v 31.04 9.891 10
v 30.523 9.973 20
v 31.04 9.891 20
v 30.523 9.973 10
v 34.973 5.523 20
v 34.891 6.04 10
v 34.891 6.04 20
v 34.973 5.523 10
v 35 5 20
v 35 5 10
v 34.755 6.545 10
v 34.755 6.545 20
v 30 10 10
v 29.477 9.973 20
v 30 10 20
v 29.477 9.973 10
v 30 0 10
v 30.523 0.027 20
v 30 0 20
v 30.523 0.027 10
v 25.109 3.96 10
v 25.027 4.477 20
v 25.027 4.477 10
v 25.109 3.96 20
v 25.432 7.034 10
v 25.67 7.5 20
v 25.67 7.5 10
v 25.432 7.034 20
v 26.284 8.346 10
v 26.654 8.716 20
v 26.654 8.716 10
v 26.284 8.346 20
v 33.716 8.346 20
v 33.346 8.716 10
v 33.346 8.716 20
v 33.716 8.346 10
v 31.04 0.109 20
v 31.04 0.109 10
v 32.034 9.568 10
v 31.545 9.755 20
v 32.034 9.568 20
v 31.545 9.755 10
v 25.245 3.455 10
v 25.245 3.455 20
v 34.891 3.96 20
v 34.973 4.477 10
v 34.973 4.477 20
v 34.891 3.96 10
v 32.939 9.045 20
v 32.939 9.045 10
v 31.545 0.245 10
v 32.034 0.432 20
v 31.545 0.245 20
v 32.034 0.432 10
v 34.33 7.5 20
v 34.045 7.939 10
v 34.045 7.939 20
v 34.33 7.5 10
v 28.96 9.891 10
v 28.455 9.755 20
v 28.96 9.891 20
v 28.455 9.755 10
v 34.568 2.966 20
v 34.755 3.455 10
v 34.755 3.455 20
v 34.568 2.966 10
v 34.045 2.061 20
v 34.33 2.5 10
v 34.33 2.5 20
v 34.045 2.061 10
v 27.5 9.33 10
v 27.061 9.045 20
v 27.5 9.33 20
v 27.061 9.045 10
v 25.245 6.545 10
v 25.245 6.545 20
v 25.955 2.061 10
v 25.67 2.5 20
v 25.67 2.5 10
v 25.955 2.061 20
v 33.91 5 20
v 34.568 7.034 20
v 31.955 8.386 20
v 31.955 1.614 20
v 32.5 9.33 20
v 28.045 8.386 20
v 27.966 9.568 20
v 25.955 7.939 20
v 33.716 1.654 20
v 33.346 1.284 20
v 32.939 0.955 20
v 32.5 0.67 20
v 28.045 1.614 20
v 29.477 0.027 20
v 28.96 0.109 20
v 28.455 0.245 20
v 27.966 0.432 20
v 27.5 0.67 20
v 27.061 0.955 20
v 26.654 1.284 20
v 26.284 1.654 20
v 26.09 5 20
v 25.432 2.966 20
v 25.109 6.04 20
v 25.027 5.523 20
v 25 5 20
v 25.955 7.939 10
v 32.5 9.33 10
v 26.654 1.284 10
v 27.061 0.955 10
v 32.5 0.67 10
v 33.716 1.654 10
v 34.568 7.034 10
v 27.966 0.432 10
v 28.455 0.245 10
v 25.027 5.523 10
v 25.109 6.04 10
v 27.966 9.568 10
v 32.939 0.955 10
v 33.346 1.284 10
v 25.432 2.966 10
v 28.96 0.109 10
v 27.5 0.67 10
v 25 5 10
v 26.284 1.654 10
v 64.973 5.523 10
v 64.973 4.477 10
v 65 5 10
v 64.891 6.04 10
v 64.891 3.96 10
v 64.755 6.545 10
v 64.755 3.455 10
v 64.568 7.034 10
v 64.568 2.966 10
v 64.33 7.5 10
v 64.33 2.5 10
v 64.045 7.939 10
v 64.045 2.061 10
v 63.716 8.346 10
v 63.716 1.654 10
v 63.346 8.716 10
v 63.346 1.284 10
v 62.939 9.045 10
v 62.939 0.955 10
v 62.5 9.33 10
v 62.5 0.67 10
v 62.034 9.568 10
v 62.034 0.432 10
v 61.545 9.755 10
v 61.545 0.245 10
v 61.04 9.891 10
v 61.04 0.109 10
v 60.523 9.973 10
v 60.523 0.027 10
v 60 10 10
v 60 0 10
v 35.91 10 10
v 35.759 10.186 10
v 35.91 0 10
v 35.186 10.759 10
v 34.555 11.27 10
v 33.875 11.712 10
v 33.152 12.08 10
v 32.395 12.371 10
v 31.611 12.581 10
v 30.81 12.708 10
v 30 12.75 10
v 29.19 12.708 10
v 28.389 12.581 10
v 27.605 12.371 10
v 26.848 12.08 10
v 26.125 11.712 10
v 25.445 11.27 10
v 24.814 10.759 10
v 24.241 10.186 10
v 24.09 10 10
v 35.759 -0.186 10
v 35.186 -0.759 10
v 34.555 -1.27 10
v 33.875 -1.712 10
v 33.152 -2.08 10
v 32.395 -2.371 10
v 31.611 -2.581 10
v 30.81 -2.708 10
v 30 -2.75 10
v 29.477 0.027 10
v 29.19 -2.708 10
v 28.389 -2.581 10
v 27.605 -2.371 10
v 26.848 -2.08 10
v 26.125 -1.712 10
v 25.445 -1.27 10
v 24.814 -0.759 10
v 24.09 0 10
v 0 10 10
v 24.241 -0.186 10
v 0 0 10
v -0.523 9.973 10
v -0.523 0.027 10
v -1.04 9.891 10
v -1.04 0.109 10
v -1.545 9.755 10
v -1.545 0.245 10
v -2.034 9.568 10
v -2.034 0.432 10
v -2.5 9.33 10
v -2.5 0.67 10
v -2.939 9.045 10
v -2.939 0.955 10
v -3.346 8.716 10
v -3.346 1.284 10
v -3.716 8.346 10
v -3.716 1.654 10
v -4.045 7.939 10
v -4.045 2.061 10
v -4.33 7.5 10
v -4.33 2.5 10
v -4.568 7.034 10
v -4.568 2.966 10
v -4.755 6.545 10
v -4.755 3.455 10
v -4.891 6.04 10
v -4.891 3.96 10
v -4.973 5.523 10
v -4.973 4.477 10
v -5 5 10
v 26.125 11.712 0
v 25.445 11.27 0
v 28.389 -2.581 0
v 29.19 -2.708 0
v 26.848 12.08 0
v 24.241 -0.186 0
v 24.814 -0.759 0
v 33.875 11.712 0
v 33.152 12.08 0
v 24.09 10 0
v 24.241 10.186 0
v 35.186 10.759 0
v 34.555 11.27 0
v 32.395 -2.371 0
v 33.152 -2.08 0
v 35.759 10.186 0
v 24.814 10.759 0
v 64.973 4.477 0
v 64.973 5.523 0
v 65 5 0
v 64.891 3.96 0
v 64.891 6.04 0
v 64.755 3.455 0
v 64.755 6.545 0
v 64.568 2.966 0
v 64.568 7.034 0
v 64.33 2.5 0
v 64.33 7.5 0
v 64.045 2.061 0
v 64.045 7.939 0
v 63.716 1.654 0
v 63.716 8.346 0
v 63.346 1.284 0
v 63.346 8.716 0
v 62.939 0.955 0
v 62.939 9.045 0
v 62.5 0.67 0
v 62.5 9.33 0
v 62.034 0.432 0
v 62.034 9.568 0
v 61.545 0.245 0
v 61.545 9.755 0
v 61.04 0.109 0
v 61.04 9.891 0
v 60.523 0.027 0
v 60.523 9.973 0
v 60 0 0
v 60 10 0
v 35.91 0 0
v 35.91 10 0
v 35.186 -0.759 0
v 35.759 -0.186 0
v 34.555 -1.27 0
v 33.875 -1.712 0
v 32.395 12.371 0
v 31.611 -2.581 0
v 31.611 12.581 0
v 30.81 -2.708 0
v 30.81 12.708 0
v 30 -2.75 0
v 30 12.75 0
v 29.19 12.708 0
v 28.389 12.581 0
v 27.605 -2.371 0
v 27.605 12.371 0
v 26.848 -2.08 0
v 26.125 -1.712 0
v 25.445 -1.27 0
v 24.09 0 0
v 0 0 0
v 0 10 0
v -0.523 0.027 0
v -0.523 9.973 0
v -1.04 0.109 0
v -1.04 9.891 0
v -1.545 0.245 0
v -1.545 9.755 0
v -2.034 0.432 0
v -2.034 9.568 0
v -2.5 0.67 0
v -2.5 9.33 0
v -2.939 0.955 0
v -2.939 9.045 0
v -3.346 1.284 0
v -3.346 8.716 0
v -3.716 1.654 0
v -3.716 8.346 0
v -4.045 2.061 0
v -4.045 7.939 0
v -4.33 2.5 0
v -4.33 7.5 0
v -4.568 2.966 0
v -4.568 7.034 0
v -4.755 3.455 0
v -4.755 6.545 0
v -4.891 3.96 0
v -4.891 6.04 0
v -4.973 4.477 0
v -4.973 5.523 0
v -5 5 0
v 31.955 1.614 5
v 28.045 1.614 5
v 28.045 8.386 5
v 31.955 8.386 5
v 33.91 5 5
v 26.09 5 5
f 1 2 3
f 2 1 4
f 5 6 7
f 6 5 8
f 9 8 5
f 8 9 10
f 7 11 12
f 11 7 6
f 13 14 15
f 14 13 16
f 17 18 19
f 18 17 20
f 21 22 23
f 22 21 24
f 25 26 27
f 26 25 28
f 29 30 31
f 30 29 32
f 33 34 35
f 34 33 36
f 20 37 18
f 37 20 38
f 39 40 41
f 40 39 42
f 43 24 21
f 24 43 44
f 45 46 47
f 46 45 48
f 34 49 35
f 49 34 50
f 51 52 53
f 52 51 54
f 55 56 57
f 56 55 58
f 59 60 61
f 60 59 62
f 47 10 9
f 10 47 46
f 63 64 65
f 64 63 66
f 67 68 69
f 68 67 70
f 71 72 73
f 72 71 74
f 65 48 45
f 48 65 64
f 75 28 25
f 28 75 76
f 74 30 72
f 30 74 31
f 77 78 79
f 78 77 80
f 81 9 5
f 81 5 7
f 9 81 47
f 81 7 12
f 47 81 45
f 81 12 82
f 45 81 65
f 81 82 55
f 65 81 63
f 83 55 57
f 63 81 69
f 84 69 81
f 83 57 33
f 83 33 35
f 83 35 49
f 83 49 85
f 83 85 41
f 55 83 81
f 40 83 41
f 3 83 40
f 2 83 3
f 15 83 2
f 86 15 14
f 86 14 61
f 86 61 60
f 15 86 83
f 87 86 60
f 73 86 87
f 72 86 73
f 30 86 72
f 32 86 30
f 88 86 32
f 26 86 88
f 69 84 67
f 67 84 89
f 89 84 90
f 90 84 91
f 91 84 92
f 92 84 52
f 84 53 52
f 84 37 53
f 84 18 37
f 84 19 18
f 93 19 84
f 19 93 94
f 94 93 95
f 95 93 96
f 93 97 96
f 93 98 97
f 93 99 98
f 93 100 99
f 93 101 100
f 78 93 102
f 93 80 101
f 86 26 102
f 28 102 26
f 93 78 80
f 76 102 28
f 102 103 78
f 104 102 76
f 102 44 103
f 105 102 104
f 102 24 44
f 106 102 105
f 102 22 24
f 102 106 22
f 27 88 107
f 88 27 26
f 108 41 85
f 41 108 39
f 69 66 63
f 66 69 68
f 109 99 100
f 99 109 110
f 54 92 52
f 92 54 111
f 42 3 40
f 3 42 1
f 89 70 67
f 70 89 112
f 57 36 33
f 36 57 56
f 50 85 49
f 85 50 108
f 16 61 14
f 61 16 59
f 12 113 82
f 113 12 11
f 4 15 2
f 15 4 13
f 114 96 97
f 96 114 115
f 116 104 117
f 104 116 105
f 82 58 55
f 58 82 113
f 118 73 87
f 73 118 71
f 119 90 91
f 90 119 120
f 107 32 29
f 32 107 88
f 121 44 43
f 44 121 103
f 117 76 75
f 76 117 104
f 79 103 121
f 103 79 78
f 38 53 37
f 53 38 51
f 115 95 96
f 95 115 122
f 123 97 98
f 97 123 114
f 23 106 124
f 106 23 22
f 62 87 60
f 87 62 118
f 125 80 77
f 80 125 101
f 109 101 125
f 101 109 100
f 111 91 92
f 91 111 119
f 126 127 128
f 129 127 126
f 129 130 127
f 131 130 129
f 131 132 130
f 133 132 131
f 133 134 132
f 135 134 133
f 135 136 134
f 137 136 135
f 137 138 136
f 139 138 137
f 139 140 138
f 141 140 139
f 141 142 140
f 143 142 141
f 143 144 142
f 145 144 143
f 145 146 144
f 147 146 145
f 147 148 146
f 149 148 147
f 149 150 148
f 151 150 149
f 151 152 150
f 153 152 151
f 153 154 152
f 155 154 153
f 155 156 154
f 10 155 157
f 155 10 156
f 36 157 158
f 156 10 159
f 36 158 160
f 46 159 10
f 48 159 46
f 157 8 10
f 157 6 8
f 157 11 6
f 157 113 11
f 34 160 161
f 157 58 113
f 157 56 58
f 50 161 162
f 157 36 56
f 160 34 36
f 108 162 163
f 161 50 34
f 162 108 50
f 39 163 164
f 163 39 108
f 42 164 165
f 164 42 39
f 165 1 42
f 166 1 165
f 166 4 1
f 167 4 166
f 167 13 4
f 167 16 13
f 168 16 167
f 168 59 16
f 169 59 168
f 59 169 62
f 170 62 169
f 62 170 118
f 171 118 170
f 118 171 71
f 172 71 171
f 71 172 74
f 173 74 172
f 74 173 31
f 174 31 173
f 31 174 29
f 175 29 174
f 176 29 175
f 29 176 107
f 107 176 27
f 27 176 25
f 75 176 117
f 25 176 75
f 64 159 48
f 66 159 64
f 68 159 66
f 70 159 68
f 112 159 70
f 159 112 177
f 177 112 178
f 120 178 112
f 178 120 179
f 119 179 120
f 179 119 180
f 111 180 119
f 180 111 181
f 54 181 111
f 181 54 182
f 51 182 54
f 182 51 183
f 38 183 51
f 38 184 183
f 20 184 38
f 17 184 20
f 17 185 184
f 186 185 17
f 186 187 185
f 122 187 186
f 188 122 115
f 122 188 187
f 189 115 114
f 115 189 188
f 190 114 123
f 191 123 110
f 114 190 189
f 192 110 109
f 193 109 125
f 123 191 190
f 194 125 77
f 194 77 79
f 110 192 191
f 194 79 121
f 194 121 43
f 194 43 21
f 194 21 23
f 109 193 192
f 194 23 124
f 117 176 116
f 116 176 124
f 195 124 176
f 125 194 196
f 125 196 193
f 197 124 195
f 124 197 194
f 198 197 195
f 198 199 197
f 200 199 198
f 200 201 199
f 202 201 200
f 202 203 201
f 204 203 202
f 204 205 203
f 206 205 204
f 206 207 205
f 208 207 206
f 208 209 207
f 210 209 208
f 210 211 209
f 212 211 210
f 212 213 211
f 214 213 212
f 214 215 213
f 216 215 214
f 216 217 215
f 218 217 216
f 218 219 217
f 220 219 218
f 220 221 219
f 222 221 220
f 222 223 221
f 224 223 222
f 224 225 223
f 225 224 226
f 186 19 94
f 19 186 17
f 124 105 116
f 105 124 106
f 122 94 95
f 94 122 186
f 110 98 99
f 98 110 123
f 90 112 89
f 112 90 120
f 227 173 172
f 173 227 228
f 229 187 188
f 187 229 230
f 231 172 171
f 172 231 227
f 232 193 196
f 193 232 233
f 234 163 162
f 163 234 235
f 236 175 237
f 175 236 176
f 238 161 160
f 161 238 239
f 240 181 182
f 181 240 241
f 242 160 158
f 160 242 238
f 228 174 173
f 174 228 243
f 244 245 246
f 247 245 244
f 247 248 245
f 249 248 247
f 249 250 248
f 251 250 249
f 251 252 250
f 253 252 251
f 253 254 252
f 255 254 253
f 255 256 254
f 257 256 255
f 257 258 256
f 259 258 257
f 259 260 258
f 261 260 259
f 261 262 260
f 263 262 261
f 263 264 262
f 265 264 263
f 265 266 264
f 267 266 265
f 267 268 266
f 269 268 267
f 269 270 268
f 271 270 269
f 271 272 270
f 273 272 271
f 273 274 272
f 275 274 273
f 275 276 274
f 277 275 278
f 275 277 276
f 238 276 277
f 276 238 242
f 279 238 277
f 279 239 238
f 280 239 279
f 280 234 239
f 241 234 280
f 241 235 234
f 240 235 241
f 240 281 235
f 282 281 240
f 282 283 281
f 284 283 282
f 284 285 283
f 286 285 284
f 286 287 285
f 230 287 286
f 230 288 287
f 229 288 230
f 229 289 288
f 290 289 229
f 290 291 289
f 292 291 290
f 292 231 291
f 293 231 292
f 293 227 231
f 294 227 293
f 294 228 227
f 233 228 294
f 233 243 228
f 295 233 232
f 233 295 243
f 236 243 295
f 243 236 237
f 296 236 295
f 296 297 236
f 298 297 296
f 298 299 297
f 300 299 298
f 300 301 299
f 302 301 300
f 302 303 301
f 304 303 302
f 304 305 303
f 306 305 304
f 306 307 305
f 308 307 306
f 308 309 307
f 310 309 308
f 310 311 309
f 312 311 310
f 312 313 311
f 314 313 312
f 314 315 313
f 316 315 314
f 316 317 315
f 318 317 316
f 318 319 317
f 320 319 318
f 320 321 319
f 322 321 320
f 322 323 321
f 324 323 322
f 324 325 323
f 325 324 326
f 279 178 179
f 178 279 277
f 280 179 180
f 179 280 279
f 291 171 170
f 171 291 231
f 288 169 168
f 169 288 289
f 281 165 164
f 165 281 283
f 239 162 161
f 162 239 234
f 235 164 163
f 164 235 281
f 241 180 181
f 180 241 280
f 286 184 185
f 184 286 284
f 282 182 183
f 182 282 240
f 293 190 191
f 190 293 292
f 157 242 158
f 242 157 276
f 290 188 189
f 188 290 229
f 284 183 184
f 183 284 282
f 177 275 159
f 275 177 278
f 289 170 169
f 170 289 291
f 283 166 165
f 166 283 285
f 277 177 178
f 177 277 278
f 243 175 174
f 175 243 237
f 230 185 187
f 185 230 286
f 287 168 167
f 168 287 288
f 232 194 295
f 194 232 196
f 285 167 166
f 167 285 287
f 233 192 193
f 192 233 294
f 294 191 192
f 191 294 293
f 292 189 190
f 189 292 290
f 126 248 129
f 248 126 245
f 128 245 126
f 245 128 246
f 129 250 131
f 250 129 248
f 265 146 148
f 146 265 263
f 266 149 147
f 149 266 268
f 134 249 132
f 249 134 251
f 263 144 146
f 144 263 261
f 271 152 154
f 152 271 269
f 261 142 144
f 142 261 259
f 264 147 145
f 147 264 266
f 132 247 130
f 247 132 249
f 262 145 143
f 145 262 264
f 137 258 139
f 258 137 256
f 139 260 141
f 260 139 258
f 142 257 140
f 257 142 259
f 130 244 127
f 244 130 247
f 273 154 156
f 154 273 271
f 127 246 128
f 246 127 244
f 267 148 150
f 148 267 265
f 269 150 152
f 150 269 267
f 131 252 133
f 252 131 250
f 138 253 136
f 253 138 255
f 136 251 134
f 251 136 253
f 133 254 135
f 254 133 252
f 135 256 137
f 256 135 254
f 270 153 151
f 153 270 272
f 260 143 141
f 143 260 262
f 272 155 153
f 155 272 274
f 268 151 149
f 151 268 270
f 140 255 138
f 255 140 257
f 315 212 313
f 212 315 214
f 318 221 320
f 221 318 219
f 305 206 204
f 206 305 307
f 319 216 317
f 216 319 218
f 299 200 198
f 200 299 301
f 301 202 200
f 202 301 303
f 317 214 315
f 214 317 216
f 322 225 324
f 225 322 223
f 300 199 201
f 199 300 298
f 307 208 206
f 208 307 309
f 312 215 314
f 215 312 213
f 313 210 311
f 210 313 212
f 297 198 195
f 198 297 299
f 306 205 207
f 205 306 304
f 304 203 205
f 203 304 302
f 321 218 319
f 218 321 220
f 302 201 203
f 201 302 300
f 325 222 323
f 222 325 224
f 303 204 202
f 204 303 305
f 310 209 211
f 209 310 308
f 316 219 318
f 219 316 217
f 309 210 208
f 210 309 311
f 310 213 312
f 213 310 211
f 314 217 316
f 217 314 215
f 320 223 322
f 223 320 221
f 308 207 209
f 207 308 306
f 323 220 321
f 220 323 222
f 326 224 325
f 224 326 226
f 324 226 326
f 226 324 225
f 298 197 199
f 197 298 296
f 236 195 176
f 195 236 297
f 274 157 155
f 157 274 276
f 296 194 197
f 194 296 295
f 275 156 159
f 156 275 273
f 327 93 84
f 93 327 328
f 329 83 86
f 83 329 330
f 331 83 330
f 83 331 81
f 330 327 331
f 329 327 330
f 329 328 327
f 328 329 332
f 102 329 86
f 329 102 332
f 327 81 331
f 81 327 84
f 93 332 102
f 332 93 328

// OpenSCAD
difference(){
    base();
    translate([30,5,5]) cylinder(34,3.91,3.91, $fn=6);
}

module base(){
    union(){
        translate([30,5,0]) {
            translate([0,0,10]) cylinder(10,5,5,$fn=60);
            cylinder(10,7.75,7.75,$fn=60);
        }

        translate([60,5,0]) cylinder(10,5,5, $fn=60);
        translate([0,5,0]) cylinder(10,5,5, $fn=60);
        cube([60,10,10]);
    }
}
